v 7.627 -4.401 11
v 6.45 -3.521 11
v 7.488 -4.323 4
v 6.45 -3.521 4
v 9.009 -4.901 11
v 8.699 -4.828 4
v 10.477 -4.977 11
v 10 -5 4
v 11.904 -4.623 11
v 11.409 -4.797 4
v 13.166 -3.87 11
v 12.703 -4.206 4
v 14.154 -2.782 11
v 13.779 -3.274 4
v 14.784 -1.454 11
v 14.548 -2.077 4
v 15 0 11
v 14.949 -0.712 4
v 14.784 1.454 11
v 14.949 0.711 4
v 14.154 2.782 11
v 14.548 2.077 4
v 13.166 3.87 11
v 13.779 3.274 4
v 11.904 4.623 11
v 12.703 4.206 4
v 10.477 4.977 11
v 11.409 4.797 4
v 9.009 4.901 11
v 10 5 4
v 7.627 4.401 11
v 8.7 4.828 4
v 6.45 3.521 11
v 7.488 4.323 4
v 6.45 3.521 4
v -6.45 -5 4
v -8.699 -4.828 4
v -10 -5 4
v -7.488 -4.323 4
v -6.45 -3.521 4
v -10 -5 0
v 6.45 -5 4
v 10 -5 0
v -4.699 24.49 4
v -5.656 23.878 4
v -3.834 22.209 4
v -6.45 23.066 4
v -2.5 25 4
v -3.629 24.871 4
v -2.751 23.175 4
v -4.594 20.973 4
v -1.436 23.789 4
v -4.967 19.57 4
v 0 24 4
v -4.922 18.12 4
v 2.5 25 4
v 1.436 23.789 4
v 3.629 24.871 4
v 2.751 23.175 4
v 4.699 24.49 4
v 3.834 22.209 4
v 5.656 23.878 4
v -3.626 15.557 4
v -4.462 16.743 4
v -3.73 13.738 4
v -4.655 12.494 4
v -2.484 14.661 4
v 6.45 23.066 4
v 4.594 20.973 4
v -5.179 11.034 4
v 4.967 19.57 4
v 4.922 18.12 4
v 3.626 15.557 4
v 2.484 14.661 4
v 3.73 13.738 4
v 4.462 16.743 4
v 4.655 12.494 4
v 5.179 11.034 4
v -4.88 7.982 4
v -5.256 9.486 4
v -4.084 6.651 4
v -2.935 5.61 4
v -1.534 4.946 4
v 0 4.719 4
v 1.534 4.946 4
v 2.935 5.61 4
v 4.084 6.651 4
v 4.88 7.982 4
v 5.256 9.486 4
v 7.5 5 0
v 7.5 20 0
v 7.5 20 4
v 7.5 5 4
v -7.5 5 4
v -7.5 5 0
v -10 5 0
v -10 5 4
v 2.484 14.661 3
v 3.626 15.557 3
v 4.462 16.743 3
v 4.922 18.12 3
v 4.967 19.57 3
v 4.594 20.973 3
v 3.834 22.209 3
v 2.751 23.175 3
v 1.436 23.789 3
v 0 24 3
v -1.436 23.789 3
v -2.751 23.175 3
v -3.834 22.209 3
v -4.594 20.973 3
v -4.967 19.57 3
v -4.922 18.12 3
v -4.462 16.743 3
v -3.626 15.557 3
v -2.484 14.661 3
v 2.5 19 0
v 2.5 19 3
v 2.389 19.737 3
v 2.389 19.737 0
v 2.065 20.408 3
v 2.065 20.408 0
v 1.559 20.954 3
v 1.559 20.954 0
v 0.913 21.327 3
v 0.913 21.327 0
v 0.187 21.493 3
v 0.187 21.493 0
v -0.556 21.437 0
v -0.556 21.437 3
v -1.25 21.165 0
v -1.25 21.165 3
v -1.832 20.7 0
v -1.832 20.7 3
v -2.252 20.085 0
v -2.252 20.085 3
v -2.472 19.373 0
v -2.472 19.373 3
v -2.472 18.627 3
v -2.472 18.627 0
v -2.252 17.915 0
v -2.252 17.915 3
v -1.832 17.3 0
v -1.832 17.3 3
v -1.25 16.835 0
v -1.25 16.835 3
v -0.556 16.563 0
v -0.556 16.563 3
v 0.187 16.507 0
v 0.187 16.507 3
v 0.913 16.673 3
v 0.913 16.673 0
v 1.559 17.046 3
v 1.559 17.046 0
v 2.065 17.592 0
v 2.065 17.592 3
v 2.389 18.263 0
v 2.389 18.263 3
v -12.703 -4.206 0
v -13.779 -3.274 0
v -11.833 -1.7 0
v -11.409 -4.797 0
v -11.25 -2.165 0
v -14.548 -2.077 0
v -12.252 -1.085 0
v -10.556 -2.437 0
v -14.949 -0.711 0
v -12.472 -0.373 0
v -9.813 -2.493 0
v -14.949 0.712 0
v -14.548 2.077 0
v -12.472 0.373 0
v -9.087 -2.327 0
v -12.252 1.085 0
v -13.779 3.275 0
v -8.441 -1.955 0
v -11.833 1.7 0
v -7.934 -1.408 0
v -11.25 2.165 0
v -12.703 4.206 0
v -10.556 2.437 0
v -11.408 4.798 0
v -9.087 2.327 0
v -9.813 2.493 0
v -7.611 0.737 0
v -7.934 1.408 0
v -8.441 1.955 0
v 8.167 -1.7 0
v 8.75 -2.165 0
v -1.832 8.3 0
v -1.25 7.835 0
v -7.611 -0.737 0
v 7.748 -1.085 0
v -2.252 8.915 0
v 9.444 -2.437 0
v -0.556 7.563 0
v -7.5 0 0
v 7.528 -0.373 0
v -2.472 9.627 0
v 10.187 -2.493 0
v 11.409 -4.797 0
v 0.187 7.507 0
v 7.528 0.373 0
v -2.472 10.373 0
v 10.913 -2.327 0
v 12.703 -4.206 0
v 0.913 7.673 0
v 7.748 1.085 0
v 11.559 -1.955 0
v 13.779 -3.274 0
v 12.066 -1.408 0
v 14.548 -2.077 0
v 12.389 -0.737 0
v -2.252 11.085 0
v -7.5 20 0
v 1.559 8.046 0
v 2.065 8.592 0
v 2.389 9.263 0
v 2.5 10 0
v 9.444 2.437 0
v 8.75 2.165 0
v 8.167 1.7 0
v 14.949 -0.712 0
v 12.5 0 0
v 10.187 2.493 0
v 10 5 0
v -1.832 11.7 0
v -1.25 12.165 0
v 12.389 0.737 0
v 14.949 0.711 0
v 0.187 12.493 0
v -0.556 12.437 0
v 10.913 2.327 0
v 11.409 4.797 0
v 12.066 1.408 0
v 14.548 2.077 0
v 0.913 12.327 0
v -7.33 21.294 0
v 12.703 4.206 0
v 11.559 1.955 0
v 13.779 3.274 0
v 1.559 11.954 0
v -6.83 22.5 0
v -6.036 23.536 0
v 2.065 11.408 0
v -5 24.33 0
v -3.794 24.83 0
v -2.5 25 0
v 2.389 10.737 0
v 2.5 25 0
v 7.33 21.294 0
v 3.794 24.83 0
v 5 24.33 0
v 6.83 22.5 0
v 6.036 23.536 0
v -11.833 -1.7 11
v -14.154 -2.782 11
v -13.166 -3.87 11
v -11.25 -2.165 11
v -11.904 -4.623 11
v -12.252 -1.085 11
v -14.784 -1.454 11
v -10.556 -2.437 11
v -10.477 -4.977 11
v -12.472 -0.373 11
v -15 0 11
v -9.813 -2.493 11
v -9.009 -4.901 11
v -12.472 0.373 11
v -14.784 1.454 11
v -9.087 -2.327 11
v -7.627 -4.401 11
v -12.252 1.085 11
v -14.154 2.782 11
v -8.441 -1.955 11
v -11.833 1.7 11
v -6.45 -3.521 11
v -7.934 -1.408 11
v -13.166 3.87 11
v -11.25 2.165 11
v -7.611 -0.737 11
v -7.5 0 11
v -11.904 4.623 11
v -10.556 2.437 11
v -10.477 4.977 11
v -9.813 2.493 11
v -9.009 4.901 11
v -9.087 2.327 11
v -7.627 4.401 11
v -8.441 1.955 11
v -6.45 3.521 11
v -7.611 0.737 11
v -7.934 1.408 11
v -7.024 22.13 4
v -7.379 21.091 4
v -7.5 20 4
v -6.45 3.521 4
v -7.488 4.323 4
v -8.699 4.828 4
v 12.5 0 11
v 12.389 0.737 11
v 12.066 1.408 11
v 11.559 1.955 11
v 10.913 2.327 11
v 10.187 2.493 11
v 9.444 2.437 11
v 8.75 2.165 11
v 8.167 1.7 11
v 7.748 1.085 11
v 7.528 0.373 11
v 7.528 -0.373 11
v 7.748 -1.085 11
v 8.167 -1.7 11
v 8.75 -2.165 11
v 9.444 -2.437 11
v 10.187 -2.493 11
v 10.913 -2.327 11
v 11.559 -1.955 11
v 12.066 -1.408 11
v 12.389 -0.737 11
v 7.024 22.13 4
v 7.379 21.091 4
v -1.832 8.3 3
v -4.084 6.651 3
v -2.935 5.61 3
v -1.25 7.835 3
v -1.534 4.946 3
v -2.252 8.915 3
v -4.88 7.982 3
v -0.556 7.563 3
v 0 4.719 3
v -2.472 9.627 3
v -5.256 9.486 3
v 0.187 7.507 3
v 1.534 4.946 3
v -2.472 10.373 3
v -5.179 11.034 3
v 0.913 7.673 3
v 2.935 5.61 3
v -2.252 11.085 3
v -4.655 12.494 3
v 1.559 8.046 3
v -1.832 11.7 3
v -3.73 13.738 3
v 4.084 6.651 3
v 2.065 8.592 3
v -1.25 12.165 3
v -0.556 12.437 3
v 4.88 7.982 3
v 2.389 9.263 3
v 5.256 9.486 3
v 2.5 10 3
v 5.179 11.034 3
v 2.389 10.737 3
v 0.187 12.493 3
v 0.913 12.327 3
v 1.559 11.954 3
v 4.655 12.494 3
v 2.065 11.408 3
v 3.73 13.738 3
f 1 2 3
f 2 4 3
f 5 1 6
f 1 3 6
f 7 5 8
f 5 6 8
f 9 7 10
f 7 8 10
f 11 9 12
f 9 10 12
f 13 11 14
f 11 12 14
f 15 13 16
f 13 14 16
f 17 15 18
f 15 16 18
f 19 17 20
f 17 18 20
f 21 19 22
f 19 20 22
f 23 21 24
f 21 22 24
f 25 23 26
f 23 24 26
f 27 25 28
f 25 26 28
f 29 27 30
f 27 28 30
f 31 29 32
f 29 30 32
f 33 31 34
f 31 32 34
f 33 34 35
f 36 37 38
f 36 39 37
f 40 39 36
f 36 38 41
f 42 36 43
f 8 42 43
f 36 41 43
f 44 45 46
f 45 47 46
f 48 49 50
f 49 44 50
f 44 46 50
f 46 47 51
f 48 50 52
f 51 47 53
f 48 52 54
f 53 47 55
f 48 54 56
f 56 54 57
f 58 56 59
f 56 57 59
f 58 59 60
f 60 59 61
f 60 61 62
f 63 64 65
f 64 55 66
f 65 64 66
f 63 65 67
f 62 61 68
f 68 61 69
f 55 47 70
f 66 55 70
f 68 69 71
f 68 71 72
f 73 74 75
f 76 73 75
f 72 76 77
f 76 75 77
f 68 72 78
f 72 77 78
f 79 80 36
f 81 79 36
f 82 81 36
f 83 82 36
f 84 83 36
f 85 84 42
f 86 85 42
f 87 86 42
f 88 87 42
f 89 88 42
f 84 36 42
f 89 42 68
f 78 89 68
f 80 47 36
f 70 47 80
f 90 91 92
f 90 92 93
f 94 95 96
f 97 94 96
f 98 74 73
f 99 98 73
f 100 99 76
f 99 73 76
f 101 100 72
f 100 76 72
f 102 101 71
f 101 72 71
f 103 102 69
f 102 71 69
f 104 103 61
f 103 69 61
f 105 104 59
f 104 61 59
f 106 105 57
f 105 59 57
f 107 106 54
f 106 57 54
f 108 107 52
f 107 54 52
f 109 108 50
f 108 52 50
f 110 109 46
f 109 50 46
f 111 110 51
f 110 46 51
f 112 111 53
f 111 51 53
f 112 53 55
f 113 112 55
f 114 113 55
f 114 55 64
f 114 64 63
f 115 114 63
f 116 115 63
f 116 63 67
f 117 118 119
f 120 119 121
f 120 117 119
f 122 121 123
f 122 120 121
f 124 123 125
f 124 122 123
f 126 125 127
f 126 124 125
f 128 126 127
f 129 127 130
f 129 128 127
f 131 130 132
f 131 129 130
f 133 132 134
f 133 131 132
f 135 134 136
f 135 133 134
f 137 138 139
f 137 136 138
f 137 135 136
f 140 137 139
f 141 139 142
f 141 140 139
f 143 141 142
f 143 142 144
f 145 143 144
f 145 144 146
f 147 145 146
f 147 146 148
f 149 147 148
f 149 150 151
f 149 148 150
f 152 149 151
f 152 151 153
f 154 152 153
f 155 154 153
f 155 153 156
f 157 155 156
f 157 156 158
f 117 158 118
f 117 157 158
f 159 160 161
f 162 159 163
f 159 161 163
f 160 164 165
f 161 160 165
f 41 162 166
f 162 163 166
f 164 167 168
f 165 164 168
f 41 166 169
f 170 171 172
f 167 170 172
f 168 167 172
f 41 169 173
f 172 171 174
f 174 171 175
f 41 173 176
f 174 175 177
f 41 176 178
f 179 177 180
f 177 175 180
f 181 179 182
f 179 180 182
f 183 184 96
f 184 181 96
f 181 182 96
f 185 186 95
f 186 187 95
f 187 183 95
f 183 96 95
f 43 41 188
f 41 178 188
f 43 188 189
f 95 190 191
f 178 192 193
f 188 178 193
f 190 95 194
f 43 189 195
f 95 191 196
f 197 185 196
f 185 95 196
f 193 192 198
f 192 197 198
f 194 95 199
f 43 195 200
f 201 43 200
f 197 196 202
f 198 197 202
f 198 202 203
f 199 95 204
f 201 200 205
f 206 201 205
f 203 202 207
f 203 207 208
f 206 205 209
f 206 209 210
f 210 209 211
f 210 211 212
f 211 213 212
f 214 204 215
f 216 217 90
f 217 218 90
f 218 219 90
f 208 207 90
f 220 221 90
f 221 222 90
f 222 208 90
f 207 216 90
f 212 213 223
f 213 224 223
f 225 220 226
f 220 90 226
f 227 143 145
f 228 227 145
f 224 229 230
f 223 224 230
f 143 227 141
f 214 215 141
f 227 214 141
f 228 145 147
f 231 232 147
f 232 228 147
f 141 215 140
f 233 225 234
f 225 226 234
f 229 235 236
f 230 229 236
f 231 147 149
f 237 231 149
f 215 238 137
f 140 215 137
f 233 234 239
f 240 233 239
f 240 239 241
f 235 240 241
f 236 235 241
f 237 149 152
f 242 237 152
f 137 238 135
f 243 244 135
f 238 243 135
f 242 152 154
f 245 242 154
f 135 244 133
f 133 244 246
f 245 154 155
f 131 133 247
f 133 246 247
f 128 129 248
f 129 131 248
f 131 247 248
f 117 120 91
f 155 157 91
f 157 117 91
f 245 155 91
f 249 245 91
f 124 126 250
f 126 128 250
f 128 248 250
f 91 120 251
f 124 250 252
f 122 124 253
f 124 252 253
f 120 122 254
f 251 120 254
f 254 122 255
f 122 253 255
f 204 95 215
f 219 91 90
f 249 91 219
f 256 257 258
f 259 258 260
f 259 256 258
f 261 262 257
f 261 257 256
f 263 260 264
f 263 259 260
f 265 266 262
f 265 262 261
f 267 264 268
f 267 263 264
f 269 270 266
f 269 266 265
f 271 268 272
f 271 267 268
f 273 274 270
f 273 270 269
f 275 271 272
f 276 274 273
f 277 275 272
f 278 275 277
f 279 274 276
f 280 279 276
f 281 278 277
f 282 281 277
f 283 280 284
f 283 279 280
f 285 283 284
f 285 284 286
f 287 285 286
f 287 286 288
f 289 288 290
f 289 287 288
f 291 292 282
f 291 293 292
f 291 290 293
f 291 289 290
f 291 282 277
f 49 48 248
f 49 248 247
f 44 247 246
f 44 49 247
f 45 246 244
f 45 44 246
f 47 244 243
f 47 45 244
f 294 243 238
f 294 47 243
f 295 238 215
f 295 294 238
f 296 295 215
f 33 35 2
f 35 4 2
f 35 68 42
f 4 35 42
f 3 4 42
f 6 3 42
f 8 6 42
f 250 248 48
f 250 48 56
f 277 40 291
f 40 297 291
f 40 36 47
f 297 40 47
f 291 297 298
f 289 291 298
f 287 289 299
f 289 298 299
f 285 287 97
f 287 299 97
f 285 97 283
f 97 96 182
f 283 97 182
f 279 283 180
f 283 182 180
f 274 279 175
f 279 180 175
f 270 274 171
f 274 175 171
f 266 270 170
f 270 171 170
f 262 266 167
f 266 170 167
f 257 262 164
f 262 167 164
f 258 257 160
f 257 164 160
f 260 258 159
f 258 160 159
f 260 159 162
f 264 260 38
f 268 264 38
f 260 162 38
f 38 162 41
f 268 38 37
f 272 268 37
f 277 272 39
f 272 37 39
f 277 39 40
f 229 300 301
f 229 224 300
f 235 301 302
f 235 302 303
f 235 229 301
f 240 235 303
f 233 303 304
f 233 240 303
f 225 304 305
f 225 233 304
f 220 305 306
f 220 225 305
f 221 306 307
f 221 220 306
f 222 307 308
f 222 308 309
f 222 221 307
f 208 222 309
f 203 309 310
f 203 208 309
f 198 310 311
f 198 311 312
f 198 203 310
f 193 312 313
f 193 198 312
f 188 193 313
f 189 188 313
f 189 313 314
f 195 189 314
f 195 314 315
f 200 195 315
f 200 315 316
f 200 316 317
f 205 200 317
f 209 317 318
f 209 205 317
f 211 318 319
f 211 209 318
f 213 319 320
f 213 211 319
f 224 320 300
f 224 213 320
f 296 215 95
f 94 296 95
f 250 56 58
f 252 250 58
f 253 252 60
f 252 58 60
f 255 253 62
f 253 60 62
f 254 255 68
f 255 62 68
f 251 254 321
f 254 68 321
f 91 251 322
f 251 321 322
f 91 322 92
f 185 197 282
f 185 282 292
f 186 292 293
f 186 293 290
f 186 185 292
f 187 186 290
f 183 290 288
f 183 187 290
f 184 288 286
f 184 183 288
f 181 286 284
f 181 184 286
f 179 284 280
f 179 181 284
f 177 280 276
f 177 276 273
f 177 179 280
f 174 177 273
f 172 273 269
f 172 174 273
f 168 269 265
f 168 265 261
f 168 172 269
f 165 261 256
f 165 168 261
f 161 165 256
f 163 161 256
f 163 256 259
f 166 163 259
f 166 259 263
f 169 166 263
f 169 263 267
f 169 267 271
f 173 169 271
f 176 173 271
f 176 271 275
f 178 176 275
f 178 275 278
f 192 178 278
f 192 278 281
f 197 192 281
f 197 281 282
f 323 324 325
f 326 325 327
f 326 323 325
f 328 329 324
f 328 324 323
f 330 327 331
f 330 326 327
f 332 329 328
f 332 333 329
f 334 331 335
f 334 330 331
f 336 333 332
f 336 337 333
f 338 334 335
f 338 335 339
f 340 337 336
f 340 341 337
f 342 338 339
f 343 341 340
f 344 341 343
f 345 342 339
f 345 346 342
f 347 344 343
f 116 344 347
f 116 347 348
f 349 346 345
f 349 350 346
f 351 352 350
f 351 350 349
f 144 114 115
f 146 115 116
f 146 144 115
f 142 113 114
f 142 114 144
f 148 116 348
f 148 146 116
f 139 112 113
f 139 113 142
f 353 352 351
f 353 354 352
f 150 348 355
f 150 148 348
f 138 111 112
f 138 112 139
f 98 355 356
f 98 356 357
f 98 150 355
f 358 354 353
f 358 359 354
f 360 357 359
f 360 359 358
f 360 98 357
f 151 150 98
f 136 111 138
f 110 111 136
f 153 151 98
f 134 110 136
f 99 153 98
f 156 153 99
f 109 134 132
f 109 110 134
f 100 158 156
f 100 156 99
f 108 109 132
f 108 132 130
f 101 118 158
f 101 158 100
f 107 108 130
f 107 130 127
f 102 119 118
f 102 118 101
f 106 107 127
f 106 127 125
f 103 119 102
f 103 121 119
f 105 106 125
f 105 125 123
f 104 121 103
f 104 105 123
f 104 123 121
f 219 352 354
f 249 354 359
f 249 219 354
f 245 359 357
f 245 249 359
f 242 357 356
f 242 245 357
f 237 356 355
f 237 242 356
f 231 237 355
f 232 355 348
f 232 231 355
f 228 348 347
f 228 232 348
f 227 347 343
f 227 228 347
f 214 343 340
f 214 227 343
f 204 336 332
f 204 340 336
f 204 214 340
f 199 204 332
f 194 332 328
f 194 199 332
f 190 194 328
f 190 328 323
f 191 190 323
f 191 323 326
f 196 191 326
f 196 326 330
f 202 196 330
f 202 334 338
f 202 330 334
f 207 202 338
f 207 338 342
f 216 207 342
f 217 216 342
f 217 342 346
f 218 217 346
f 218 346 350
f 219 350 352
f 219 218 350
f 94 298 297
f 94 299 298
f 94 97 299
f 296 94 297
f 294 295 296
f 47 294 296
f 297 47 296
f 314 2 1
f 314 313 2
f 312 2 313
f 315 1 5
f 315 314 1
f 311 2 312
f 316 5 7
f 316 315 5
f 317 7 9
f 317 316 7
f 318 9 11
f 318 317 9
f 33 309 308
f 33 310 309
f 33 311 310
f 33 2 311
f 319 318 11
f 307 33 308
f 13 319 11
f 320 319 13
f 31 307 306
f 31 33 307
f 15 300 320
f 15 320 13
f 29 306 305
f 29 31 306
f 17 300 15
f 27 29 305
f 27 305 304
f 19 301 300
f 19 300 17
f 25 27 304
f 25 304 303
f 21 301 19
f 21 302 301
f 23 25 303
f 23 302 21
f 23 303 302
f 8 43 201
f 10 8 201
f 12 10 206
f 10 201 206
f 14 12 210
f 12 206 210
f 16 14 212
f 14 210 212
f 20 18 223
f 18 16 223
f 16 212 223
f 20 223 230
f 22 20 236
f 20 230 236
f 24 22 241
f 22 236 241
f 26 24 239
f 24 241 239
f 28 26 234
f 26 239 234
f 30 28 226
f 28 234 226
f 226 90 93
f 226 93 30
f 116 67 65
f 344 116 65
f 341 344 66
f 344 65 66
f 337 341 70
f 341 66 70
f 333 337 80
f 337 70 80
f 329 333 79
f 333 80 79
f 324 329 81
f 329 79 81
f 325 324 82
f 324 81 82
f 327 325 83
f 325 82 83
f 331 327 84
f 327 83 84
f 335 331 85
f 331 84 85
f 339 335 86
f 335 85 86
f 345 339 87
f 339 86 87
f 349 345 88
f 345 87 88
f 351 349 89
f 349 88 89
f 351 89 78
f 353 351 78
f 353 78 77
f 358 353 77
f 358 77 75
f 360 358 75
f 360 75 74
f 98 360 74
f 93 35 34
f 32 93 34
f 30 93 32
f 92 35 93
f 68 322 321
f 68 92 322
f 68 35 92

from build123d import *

# Parameters (mm, degrees)
SKETCH_R          = 2.5
SKETCH_R_2        = 2.499821
PAD_DEPTH         = 4
SKETCH001_R       = 5
SKETCH001_R_2     = 2.5
PAD001_DEPTH      = 7
FILLET_R          = 5
SKETCH002_W       = 12.9
SKETCH002_H       = 8.550953
POCKET_DEPTH      = 25.001
POCKET_DEPTH_BACK = 5.001
SKETCH003_R       = 5
SKETCH003_R_2     = 5.281206
POCKET001_DEPTH   = 1


with BuildPart() as part:
    # Sketch → Pad (new body)
    with BuildSketch(Plane.XY):
        with BuildLine():
            Line((-10, -5), (10, -5))
            ThreePointArc((10, -5), (15, -0.000187), (10.000374, 5))
            Line((7.5, 5), (10.000374, 5))
            Line((7.5, 25), (7.5, 5))
            Line((-7.5, 25), (7.5, 25))
            Line((-7.5, 25), (-7.5, 5))
            Line((-7.5, 5), (-9.999626, 5))
            ThreePointArc((-9.999626, 5), (-15, 0.000187), (-10, -5))
        make_face()
        with Locations((-10, 0)):
            Circle(SKETCH_R, mode=Mode.SUBTRACT)
        with Locations((10, 0)):
            Circle(SKETCH_R, mode=Mode.SUBTRACT)
        with Locations((0, 19)):
            Circle(SKETCH_R_2, mode=Mode.SUBTRACT)
        with Locations((0, 10)):
            Circle(SKETCH_R_2, mode=Mode.SUBTRACT)
    extrude(amount=PAD_DEPTH)

    # Sketch001 (on Face14 of Pad) → Pad001 (join)
    with BuildSketch(Plane.XY.offset(4)):
        with Locations((10, 0)):
            Circle(SKETCH001_R)
        with Locations((10, 0)):
            Circle(SKETCH001_R_2, mode=Mode.SUBTRACT)
        with Locations((-10, 0)):
            Circle(SKETCH001_R)
        with Locations((-10, 0)):
            Circle(SKETCH001_R_2, mode=Mode.SUBTRACT)
    extrude(amount=PAD001_DEPTH)

    # Fillet
    fillet_edges = [part.edges().sort_by_distance(p)[0] for p in [
        (-7.5, 25, 2),
        (7.5, 25, 2),
    ]]
    fillet(fillet_edges, radius=FILLET_R)

    # Sketch002 → Pocket (cut, two sides)
    with BuildSketch(Plane.XZ) as pocket_sk:
        with Locations((0, 8.275476)):
            Rectangle(SKETCH002_W, SKETCH002_H)
    extrude(amount=-POCKET_DEPTH, mode=Mode.SUBTRACT)
    extrude(pocket_sk.sketch, amount=POCKET_DEPTH_BACK, mode=Mode.SUBTRACT)

    # Sketch003 (on Face19 of Pocket) → Pocket001 (cut)
    with BuildSketch(Plane.XY.offset(4)):
        with Locations((0, 19)):
            Circle(SKETCH003_R)
        with Locations((0, 10)):
            Circle(SKETCH003_R_2)
    extrude(amount=-POCKET001_DEPTH, mode=Mode.SUBTRACT)


solid = part.part
